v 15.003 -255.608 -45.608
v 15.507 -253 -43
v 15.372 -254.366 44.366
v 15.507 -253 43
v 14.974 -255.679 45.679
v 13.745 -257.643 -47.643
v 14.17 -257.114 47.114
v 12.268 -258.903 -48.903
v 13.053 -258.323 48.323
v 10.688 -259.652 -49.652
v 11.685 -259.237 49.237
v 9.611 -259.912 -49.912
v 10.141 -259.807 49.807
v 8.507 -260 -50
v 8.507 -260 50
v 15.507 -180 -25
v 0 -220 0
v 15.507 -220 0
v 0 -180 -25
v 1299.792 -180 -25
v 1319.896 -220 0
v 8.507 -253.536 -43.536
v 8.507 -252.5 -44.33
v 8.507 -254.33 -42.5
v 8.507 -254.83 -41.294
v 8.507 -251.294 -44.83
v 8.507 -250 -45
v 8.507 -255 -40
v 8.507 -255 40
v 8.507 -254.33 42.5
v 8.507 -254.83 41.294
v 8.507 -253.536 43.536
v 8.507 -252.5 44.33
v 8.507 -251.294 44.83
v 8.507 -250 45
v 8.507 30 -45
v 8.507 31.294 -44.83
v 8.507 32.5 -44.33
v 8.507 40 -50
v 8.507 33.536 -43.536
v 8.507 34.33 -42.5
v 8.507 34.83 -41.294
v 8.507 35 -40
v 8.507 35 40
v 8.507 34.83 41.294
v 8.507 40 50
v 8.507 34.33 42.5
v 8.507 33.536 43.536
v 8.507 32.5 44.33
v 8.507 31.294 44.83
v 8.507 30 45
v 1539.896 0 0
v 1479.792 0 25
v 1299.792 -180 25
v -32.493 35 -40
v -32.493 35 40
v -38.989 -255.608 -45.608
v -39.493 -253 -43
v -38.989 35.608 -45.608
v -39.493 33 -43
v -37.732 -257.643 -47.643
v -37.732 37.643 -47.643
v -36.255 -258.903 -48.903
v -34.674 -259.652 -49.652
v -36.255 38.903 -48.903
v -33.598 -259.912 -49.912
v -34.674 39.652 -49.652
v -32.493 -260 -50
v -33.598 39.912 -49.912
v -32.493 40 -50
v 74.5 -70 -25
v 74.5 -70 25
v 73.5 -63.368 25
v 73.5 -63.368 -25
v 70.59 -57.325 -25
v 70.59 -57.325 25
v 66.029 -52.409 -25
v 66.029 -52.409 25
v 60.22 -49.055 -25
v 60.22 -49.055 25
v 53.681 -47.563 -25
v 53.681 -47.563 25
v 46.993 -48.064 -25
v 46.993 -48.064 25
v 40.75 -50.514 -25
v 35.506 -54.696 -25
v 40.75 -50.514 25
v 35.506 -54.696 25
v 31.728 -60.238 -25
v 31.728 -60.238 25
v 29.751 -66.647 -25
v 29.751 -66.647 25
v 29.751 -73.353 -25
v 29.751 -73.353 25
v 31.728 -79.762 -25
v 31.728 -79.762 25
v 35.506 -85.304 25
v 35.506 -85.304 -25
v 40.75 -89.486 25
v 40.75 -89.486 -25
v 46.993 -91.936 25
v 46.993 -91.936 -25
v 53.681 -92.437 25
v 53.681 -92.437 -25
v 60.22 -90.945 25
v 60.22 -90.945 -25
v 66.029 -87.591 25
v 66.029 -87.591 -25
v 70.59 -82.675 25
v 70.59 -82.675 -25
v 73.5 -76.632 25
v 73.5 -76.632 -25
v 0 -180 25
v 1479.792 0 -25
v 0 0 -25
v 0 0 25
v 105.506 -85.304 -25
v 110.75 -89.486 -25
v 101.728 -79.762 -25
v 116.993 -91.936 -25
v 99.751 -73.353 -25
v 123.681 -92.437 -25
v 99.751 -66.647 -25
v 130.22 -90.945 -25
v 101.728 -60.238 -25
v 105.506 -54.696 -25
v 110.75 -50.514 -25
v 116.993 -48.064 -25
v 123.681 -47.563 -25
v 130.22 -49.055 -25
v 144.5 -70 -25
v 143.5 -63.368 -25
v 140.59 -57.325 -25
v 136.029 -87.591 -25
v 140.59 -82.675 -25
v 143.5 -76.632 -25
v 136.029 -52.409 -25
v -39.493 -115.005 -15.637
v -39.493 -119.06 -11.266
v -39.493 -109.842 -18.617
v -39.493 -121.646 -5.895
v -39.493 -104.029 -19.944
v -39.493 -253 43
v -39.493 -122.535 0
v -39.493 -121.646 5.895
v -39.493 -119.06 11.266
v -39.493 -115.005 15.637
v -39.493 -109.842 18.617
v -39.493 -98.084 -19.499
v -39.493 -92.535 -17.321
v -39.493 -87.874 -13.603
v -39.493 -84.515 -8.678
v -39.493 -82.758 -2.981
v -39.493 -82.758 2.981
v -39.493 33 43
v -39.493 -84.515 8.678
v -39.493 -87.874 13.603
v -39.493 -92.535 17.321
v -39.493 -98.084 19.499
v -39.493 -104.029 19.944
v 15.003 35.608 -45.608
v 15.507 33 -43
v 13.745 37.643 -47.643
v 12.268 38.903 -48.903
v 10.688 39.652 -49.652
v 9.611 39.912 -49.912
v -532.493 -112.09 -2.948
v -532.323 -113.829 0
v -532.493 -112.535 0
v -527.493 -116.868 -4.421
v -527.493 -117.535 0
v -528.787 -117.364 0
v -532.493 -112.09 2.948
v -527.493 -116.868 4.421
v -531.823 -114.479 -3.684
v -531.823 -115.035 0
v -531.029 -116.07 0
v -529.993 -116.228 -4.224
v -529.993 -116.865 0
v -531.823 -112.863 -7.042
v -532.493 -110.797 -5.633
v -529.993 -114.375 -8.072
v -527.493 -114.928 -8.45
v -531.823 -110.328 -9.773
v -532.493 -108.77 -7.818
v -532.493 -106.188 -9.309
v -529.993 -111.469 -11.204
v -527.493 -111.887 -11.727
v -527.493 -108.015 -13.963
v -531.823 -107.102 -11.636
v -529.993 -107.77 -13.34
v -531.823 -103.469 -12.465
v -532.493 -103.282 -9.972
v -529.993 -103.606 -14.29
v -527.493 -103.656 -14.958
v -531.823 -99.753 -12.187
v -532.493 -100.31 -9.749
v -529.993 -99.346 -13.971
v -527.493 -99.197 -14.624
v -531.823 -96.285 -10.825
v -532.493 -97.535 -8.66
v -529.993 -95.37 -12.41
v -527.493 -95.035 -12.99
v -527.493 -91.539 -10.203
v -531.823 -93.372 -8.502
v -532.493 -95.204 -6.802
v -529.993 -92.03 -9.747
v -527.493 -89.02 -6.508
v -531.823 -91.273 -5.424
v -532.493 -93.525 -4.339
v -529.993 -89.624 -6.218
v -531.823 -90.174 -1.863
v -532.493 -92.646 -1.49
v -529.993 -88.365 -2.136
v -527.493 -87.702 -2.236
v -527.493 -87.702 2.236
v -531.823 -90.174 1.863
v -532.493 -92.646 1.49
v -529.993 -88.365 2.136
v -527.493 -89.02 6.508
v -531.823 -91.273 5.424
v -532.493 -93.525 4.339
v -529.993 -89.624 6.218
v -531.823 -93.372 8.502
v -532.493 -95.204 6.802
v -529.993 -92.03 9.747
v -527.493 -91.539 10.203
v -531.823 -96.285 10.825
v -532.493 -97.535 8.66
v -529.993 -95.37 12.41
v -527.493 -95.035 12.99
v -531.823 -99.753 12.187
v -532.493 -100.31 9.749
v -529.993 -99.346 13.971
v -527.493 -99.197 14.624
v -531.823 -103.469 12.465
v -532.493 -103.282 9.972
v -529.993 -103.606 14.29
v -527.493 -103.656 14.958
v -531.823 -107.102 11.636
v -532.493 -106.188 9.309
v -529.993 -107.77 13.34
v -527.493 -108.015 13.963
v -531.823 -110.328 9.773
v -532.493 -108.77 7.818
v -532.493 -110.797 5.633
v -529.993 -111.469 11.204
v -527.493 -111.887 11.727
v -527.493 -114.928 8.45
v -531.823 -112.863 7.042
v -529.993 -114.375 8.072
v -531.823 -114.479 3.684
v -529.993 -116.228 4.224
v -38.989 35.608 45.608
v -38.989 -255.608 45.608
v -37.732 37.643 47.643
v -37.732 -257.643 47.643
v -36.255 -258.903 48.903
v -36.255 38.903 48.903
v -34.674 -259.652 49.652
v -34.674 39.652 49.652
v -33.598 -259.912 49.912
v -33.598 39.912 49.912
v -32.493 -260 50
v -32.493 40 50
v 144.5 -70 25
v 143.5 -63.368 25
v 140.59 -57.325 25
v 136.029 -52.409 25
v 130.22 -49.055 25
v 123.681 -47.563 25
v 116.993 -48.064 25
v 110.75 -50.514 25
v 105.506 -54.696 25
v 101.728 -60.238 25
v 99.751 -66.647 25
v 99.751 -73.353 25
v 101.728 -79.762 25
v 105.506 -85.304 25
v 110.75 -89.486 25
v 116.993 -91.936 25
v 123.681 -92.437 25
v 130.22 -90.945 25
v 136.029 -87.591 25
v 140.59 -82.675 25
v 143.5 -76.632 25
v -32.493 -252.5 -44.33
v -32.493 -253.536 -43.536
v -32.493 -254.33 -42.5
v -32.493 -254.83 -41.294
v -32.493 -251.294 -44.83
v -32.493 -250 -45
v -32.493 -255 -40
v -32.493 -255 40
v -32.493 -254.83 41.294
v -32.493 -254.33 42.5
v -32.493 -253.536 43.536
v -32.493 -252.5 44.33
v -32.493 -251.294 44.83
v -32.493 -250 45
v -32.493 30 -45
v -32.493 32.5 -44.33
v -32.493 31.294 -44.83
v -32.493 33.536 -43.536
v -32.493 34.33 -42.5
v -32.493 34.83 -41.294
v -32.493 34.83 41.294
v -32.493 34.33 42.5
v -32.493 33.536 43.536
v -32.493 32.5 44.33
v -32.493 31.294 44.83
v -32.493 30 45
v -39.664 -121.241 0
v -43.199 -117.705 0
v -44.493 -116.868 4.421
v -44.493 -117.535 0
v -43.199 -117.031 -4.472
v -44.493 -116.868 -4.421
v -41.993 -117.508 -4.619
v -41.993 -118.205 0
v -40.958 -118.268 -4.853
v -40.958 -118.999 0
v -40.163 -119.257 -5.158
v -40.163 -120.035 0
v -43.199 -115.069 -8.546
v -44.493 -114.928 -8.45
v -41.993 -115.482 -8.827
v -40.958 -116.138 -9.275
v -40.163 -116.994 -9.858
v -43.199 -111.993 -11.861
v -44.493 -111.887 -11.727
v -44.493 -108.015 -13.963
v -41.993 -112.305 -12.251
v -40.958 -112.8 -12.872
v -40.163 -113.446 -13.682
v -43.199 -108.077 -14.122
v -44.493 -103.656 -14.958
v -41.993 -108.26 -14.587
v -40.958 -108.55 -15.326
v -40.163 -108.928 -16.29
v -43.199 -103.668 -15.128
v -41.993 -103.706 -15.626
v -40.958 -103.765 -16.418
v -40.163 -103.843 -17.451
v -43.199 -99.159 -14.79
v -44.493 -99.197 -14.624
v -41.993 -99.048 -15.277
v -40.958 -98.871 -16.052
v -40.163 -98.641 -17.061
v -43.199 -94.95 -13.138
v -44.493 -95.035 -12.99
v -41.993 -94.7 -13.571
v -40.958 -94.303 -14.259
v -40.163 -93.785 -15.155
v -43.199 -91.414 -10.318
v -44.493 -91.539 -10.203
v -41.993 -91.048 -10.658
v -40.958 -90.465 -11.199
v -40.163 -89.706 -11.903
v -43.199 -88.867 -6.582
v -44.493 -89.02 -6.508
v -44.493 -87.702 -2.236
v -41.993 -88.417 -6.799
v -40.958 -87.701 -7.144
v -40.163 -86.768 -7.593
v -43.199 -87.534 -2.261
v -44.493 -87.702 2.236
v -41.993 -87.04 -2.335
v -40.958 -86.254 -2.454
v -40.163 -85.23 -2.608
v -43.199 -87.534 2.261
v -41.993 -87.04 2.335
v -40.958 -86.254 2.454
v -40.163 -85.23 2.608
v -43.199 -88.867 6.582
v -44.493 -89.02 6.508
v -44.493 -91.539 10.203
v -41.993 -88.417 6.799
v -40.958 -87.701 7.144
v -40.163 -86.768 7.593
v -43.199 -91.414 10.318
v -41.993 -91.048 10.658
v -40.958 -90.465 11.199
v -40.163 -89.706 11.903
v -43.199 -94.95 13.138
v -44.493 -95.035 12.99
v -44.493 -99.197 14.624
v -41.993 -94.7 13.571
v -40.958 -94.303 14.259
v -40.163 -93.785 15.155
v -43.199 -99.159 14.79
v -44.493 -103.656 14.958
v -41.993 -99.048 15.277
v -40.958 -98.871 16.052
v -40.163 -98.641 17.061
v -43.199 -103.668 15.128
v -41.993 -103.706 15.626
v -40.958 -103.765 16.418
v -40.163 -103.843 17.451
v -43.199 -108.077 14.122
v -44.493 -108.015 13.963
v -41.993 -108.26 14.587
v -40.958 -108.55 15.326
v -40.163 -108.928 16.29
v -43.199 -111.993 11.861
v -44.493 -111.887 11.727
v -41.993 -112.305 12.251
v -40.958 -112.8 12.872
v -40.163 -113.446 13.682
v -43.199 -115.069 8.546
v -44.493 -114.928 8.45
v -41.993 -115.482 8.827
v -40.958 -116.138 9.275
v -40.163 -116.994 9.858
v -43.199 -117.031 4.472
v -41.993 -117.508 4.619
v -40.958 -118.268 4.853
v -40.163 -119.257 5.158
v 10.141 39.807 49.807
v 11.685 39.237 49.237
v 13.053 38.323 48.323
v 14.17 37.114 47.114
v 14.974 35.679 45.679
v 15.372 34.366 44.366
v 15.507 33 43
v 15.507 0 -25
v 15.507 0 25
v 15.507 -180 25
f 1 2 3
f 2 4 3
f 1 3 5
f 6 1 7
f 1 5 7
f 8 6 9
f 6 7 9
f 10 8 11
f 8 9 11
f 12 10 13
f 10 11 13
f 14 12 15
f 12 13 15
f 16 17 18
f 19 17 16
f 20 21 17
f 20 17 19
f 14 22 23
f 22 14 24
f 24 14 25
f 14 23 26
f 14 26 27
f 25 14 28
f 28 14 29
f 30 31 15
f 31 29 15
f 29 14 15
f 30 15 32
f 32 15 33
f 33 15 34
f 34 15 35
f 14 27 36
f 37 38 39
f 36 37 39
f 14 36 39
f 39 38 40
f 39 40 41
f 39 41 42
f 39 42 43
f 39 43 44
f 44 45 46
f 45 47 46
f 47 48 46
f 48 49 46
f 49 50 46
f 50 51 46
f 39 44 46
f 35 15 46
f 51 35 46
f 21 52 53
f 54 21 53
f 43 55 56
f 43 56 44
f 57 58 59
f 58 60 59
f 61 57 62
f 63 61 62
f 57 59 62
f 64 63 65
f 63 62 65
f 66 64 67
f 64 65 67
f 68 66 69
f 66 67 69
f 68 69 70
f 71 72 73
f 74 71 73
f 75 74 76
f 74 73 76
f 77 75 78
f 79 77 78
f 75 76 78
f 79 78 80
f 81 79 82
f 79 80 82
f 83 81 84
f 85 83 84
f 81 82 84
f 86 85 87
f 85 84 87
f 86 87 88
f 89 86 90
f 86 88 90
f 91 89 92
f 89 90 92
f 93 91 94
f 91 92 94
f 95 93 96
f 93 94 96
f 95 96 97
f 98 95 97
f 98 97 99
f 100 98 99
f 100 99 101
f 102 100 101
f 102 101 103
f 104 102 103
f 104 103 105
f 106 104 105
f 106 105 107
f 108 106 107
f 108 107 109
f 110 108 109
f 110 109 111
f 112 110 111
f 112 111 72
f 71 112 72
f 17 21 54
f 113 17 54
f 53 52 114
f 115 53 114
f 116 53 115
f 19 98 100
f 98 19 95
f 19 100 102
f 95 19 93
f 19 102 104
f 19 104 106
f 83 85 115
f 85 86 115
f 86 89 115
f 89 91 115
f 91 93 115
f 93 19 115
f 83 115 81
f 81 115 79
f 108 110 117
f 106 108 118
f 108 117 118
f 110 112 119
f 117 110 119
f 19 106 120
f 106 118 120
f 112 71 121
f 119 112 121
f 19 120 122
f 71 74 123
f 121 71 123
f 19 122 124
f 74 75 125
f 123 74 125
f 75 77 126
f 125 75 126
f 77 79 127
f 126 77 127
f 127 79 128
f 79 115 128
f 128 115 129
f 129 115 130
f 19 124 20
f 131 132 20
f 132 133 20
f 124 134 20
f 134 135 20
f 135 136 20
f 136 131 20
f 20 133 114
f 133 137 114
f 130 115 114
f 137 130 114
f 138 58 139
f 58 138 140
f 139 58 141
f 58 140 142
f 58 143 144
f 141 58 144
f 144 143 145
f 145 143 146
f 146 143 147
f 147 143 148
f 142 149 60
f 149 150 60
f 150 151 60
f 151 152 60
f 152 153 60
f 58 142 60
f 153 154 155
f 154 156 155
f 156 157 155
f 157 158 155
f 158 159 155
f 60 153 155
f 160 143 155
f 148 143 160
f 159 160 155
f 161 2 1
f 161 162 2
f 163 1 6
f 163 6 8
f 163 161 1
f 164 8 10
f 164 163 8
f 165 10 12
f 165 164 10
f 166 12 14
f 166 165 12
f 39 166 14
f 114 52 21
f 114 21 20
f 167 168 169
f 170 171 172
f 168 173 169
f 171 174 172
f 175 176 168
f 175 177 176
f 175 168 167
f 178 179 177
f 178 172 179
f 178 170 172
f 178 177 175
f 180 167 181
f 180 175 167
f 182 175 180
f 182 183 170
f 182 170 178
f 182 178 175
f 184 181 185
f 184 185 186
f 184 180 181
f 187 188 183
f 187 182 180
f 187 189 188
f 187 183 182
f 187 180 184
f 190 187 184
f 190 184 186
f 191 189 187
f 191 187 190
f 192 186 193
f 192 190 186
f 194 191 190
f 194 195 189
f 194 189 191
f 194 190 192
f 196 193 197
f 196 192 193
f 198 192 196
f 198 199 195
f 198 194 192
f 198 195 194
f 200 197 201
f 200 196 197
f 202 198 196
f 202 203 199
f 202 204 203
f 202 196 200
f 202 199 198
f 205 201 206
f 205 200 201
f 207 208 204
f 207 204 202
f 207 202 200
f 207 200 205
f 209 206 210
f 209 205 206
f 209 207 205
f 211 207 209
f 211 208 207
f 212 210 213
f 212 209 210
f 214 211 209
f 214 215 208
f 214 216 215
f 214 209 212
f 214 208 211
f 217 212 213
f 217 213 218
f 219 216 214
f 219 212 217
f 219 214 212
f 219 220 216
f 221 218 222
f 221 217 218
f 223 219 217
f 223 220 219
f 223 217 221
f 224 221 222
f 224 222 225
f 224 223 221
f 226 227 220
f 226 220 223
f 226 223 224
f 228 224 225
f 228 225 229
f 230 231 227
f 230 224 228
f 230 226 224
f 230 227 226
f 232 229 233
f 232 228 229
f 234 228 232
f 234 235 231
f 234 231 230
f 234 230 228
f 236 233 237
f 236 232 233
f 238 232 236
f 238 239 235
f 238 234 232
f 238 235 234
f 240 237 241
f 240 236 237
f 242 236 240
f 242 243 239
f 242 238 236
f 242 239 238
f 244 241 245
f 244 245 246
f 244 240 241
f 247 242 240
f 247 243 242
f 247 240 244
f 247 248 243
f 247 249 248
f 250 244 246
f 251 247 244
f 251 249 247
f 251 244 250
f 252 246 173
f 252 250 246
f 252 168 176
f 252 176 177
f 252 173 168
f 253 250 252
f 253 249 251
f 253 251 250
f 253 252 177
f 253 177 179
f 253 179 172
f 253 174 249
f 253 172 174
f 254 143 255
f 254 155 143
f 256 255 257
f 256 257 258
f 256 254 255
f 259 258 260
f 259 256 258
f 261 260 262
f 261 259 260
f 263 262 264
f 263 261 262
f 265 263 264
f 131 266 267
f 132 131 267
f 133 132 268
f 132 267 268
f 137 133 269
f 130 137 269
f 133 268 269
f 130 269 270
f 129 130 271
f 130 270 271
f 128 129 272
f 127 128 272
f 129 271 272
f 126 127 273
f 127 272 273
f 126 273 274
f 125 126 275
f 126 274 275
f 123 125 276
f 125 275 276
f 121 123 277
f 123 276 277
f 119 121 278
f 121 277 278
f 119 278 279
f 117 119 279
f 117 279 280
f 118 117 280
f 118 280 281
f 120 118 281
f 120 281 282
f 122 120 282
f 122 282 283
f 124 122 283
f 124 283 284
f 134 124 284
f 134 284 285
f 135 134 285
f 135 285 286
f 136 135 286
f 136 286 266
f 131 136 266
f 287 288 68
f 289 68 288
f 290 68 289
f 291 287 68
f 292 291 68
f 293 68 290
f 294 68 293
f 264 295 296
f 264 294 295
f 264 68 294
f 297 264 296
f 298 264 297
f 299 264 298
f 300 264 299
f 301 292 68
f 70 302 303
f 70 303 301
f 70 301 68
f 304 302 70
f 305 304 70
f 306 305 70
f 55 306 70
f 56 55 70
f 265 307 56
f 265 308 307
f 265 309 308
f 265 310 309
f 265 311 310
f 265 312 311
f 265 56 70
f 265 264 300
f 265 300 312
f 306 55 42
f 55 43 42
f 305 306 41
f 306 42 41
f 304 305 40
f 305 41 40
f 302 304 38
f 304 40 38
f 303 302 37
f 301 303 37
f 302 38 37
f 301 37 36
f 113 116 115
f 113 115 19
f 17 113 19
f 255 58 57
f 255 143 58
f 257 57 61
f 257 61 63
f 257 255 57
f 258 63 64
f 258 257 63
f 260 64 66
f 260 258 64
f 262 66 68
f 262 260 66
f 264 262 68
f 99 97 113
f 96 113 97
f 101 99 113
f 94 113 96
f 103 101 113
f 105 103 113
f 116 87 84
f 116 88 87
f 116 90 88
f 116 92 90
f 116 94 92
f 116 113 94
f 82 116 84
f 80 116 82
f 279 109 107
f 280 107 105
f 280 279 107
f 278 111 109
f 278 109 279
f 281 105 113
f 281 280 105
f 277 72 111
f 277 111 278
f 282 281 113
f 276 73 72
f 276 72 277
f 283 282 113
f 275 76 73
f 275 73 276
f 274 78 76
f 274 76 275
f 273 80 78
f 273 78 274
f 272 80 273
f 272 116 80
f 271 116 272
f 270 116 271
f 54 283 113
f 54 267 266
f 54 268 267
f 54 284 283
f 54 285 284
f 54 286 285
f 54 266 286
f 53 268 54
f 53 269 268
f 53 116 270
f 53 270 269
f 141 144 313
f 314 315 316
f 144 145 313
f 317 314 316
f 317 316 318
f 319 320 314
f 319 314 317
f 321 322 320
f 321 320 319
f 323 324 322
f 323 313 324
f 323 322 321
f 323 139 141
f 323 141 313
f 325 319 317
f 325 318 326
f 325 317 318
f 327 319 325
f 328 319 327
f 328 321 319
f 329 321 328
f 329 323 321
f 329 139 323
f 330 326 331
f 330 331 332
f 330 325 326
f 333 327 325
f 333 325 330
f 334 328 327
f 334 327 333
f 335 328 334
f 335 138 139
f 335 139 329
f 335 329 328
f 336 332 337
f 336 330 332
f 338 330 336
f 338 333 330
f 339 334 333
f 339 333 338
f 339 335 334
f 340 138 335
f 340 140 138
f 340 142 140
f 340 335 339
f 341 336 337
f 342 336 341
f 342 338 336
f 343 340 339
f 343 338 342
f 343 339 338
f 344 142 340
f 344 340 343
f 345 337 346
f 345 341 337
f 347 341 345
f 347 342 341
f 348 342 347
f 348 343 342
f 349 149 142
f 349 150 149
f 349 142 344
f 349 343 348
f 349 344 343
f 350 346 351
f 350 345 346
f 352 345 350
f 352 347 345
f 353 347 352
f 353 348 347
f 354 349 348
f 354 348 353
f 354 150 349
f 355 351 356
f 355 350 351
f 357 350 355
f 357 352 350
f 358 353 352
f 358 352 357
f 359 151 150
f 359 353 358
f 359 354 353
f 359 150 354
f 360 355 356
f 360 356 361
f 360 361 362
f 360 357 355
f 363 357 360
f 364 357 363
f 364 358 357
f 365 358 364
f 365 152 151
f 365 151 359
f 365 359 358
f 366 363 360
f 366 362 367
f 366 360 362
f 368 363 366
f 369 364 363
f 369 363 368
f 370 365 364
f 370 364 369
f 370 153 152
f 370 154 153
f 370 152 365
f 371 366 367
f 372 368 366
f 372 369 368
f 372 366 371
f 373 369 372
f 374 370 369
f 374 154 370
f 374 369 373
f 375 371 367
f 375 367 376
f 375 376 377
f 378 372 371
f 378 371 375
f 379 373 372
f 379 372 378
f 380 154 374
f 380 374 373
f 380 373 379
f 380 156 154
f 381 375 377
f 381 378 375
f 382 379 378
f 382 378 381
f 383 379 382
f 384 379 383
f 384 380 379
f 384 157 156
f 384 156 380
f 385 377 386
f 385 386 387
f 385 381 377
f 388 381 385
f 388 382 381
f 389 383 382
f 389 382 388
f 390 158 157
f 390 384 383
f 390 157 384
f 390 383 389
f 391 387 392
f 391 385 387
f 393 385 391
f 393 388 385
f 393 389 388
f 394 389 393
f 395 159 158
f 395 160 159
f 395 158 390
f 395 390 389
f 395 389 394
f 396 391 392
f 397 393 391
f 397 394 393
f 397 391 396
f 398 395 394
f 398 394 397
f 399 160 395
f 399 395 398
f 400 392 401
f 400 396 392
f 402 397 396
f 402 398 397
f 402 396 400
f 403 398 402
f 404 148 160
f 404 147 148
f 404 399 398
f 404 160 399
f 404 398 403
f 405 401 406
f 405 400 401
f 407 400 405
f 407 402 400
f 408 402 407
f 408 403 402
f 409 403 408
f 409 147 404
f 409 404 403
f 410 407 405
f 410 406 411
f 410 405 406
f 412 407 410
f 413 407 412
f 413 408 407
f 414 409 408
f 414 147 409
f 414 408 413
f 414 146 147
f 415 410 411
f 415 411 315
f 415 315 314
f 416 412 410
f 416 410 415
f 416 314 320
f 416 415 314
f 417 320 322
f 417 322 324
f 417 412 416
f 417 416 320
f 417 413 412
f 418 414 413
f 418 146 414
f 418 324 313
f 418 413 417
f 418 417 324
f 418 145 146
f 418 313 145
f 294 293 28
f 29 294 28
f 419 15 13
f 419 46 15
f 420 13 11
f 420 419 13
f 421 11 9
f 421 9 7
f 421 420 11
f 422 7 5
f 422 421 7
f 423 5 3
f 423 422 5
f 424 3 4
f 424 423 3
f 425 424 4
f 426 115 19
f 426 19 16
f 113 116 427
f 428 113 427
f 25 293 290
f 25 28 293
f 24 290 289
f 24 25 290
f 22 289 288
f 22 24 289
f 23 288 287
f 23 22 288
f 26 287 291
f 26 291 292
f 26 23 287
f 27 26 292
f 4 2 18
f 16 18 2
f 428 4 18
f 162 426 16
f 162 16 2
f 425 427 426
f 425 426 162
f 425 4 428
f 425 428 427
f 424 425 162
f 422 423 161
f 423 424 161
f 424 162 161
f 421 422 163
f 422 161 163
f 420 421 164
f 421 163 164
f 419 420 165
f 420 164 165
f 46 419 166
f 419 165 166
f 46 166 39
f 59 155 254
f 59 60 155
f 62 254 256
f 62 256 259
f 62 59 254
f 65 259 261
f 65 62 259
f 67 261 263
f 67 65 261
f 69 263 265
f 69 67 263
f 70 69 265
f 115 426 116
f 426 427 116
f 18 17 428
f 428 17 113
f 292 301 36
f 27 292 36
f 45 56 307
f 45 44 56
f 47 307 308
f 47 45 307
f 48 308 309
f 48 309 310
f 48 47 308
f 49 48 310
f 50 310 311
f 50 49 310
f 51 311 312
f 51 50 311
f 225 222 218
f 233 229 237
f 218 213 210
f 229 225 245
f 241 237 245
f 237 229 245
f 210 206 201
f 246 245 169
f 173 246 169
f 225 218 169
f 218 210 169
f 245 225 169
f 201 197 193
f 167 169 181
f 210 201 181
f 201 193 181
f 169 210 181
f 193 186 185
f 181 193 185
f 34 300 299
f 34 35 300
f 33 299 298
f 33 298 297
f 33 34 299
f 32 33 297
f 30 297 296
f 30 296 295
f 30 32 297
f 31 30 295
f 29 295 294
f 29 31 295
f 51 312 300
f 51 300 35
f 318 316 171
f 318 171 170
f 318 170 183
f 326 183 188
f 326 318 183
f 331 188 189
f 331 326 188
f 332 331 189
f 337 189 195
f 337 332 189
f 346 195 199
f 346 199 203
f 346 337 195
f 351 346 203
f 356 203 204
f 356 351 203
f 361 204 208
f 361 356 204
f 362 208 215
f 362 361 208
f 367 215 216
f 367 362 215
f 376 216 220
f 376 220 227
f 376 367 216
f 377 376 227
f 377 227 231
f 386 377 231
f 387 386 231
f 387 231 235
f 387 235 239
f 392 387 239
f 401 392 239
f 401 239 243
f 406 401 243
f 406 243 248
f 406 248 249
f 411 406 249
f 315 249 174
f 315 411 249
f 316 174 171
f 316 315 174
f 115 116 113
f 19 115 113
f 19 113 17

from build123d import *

# Parameters (mm, degrees)
F1_DEPTH    = 25
F2_T1_DEPTH = 1920.4823536212
F3_T1_DEPTH = 694.2958053538
F5_R        = 22.5
F6_DEPTH    = 100
F7_W        = 55
F7_H        = 300
F8_DEPTH    = 50
F9_R        = 7
F10_DEPTH   = 5
F11_DEPTH   = 5
F12_DEPTH   = 5
F13_DEPTH   = 5
F14_R       = 5
F15_W       = 500
F15_H       = 15
F17_R       = 5
F18_R       = 5


# Not quite as in the source:
# - a fillet or chamfer that OpenCascade refuses, or shapes differently, is made with other operations: its cross-section is extruded or revolved along the edge and cut away or added
# - a feature names something its author has since deleted; it is built from what else it names


with BuildPart() as f1:
    # F0 (on Top) → F1 (new body)
    with BuildSketch(Plane.XY):
        Polygon((1600, 0), (0, 0), (0, -300), (1300, -300), align=None)
    extrude(amount=F1_DEPTH)

    # F2: chamfer of 120 x 75 on 1 edges, made by hand

    # F2_s2 → F2_t1 (cut)
    with BuildSketch(Plane.YZ.offset(-310.2411768106)):
        Polygon((-300, -50), (-180, 25), (-300, 25), align=None)
    extrude(amount=F2_T1_DEPTH, mode=Mode.SUBTRACT)

    # F3: chamfer of 50 x 85 on 1 edges, made by hand

    # F3_s2 → F3_t1 (cut)
    with BuildSketch(Plane(origin=(464.5293639425, 464.5293639425, 0), x_dir=(0, 0, 1), z_dir=(0.7071067812, 0.7071067812, 0))):
        Polygon((-25, 1131.3708498985), (25, 1046.3708498985), (25, 1131.3708498985), align=None)
    extrude(amount=F3_T1_DEPTH, mode=Mode.SUBTRACT)

    # F4: F1 across face


with BuildPart() as f1_1:
    add(f1.part)
    add(f1.part.mirror(Plane(origin=(716.3583208568, -107.1792818856, 0), x_dir=(1, 0, 0), z_dir=(0, 0, -1))))

    # F5 (on face) → F6 (cut)
    with BuildSketch(Plane.XY.offset(25)):
        with Locations((52, -70)):
            Circle(F5_R)
        with Locations((122, -70)):
            Circle(F5_R)
    extrude(amount=-F6_DEPTH, mode=Mode.SUBTRACT)


with BuildPart() as f8:
    # F7 (on Top) → F8 (new body, symmetric)
    with BuildSketch(Plane.XY):
        with Locations((-11.9931862531, -110)):
            Rectangle(F7_W, F7_H)
    extrude(amount=F8_DEPTH, both=True)

    # F9
    f9_edges = [f8.edges().sort_by_distance(p)[0] for p in [
        (15.506814, -110, 50),
        (15.506814, -110, -50),
        (-39.493186, -110, 50),
        (-39.493186, -260, 0),
        (-39.493186, -110, -50),
        (-39.493186, 40, 0),
        (15.506814, -260, 0),
        (15.506814, 40, 0),
    ]]
    fillet(f9_edges, radius=F9_R)

    # F10 (cut): a face of the model
    f10_faces = [f8.faces().sort_by_distance(p)[0] for p in [
        (-11.9931862531, -110, 50),
    ]]
    extrude(f10_faces, amount=-F10_DEPTH, mode=Mode.SUBTRACT)

    # F11 (cut): a face of the model
    f11_faces = [f8.faces().sort_by_distance(p)[0] for p in [
        (-11.9931862531, -260, -2.5),
    ]]
    extrude(f11_faces, amount=-F11_DEPTH, mode=Mode.SUBTRACT)

    # F12 (cut): a face of the model
    f12_faces = [f8.faces().sort_by_distance(p)[0] for p in [
        (-11.9931862531, -107.5, -50),
    ]]
    extrude(f12_faces, amount=-F12_DEPTH, mode=Mode.SUBTRACT)

    # F13 (cut): a face of the model
    f13_faces = [f8.faces().sort_by_distance(p)[0] for p in [
        (-11.9931862531, 40, 0),
    ]]
    extrude(f13_faces, amount=-F13_DEPTH, mode=Mode.SUBTRACT)

    # F14
    f14_edges = [f8.edges().sort_by_distance(p)[0] for p in [
        (-11.993186, -255, 45),
        (-11.993186, -255, -45),
        (-11.993186, 35, -45),
        (-11.993186, 35, 45),
    ]]
    fillet(f14_edges, radius=F14_R)

    # F15 (on Top) → F16 (revolve)
    with BuildSketch(Plane.XY):
        with Locations((-282.4931862531, -110.0347492099)):
            Rectangle(F15_W, F15_H)
    revolve(axis=Axis((-282.4931862531, -102.5347492099, 0), (1, 0, 0)))

    # F17
    f17_edges = [f8.edges().sort_by_distance(p)[0] for p in [
        (-532.493186, -87.534749, 0),
    ]]
    fillet(f17_edges, radius=F17_R)

    # F18
    f18_edges = [f8.edges().sort_by_distance(p)[0] for p in [
        (-39.493186, -87.534749, 0),
    ]]
    fillet(f18_edges, radius=F18_R)

    # F19: cut F1
    add(f1_1.part, mode=Mode.SUBTRACT)


solid = Compound([f1_1.part, f8.part])
